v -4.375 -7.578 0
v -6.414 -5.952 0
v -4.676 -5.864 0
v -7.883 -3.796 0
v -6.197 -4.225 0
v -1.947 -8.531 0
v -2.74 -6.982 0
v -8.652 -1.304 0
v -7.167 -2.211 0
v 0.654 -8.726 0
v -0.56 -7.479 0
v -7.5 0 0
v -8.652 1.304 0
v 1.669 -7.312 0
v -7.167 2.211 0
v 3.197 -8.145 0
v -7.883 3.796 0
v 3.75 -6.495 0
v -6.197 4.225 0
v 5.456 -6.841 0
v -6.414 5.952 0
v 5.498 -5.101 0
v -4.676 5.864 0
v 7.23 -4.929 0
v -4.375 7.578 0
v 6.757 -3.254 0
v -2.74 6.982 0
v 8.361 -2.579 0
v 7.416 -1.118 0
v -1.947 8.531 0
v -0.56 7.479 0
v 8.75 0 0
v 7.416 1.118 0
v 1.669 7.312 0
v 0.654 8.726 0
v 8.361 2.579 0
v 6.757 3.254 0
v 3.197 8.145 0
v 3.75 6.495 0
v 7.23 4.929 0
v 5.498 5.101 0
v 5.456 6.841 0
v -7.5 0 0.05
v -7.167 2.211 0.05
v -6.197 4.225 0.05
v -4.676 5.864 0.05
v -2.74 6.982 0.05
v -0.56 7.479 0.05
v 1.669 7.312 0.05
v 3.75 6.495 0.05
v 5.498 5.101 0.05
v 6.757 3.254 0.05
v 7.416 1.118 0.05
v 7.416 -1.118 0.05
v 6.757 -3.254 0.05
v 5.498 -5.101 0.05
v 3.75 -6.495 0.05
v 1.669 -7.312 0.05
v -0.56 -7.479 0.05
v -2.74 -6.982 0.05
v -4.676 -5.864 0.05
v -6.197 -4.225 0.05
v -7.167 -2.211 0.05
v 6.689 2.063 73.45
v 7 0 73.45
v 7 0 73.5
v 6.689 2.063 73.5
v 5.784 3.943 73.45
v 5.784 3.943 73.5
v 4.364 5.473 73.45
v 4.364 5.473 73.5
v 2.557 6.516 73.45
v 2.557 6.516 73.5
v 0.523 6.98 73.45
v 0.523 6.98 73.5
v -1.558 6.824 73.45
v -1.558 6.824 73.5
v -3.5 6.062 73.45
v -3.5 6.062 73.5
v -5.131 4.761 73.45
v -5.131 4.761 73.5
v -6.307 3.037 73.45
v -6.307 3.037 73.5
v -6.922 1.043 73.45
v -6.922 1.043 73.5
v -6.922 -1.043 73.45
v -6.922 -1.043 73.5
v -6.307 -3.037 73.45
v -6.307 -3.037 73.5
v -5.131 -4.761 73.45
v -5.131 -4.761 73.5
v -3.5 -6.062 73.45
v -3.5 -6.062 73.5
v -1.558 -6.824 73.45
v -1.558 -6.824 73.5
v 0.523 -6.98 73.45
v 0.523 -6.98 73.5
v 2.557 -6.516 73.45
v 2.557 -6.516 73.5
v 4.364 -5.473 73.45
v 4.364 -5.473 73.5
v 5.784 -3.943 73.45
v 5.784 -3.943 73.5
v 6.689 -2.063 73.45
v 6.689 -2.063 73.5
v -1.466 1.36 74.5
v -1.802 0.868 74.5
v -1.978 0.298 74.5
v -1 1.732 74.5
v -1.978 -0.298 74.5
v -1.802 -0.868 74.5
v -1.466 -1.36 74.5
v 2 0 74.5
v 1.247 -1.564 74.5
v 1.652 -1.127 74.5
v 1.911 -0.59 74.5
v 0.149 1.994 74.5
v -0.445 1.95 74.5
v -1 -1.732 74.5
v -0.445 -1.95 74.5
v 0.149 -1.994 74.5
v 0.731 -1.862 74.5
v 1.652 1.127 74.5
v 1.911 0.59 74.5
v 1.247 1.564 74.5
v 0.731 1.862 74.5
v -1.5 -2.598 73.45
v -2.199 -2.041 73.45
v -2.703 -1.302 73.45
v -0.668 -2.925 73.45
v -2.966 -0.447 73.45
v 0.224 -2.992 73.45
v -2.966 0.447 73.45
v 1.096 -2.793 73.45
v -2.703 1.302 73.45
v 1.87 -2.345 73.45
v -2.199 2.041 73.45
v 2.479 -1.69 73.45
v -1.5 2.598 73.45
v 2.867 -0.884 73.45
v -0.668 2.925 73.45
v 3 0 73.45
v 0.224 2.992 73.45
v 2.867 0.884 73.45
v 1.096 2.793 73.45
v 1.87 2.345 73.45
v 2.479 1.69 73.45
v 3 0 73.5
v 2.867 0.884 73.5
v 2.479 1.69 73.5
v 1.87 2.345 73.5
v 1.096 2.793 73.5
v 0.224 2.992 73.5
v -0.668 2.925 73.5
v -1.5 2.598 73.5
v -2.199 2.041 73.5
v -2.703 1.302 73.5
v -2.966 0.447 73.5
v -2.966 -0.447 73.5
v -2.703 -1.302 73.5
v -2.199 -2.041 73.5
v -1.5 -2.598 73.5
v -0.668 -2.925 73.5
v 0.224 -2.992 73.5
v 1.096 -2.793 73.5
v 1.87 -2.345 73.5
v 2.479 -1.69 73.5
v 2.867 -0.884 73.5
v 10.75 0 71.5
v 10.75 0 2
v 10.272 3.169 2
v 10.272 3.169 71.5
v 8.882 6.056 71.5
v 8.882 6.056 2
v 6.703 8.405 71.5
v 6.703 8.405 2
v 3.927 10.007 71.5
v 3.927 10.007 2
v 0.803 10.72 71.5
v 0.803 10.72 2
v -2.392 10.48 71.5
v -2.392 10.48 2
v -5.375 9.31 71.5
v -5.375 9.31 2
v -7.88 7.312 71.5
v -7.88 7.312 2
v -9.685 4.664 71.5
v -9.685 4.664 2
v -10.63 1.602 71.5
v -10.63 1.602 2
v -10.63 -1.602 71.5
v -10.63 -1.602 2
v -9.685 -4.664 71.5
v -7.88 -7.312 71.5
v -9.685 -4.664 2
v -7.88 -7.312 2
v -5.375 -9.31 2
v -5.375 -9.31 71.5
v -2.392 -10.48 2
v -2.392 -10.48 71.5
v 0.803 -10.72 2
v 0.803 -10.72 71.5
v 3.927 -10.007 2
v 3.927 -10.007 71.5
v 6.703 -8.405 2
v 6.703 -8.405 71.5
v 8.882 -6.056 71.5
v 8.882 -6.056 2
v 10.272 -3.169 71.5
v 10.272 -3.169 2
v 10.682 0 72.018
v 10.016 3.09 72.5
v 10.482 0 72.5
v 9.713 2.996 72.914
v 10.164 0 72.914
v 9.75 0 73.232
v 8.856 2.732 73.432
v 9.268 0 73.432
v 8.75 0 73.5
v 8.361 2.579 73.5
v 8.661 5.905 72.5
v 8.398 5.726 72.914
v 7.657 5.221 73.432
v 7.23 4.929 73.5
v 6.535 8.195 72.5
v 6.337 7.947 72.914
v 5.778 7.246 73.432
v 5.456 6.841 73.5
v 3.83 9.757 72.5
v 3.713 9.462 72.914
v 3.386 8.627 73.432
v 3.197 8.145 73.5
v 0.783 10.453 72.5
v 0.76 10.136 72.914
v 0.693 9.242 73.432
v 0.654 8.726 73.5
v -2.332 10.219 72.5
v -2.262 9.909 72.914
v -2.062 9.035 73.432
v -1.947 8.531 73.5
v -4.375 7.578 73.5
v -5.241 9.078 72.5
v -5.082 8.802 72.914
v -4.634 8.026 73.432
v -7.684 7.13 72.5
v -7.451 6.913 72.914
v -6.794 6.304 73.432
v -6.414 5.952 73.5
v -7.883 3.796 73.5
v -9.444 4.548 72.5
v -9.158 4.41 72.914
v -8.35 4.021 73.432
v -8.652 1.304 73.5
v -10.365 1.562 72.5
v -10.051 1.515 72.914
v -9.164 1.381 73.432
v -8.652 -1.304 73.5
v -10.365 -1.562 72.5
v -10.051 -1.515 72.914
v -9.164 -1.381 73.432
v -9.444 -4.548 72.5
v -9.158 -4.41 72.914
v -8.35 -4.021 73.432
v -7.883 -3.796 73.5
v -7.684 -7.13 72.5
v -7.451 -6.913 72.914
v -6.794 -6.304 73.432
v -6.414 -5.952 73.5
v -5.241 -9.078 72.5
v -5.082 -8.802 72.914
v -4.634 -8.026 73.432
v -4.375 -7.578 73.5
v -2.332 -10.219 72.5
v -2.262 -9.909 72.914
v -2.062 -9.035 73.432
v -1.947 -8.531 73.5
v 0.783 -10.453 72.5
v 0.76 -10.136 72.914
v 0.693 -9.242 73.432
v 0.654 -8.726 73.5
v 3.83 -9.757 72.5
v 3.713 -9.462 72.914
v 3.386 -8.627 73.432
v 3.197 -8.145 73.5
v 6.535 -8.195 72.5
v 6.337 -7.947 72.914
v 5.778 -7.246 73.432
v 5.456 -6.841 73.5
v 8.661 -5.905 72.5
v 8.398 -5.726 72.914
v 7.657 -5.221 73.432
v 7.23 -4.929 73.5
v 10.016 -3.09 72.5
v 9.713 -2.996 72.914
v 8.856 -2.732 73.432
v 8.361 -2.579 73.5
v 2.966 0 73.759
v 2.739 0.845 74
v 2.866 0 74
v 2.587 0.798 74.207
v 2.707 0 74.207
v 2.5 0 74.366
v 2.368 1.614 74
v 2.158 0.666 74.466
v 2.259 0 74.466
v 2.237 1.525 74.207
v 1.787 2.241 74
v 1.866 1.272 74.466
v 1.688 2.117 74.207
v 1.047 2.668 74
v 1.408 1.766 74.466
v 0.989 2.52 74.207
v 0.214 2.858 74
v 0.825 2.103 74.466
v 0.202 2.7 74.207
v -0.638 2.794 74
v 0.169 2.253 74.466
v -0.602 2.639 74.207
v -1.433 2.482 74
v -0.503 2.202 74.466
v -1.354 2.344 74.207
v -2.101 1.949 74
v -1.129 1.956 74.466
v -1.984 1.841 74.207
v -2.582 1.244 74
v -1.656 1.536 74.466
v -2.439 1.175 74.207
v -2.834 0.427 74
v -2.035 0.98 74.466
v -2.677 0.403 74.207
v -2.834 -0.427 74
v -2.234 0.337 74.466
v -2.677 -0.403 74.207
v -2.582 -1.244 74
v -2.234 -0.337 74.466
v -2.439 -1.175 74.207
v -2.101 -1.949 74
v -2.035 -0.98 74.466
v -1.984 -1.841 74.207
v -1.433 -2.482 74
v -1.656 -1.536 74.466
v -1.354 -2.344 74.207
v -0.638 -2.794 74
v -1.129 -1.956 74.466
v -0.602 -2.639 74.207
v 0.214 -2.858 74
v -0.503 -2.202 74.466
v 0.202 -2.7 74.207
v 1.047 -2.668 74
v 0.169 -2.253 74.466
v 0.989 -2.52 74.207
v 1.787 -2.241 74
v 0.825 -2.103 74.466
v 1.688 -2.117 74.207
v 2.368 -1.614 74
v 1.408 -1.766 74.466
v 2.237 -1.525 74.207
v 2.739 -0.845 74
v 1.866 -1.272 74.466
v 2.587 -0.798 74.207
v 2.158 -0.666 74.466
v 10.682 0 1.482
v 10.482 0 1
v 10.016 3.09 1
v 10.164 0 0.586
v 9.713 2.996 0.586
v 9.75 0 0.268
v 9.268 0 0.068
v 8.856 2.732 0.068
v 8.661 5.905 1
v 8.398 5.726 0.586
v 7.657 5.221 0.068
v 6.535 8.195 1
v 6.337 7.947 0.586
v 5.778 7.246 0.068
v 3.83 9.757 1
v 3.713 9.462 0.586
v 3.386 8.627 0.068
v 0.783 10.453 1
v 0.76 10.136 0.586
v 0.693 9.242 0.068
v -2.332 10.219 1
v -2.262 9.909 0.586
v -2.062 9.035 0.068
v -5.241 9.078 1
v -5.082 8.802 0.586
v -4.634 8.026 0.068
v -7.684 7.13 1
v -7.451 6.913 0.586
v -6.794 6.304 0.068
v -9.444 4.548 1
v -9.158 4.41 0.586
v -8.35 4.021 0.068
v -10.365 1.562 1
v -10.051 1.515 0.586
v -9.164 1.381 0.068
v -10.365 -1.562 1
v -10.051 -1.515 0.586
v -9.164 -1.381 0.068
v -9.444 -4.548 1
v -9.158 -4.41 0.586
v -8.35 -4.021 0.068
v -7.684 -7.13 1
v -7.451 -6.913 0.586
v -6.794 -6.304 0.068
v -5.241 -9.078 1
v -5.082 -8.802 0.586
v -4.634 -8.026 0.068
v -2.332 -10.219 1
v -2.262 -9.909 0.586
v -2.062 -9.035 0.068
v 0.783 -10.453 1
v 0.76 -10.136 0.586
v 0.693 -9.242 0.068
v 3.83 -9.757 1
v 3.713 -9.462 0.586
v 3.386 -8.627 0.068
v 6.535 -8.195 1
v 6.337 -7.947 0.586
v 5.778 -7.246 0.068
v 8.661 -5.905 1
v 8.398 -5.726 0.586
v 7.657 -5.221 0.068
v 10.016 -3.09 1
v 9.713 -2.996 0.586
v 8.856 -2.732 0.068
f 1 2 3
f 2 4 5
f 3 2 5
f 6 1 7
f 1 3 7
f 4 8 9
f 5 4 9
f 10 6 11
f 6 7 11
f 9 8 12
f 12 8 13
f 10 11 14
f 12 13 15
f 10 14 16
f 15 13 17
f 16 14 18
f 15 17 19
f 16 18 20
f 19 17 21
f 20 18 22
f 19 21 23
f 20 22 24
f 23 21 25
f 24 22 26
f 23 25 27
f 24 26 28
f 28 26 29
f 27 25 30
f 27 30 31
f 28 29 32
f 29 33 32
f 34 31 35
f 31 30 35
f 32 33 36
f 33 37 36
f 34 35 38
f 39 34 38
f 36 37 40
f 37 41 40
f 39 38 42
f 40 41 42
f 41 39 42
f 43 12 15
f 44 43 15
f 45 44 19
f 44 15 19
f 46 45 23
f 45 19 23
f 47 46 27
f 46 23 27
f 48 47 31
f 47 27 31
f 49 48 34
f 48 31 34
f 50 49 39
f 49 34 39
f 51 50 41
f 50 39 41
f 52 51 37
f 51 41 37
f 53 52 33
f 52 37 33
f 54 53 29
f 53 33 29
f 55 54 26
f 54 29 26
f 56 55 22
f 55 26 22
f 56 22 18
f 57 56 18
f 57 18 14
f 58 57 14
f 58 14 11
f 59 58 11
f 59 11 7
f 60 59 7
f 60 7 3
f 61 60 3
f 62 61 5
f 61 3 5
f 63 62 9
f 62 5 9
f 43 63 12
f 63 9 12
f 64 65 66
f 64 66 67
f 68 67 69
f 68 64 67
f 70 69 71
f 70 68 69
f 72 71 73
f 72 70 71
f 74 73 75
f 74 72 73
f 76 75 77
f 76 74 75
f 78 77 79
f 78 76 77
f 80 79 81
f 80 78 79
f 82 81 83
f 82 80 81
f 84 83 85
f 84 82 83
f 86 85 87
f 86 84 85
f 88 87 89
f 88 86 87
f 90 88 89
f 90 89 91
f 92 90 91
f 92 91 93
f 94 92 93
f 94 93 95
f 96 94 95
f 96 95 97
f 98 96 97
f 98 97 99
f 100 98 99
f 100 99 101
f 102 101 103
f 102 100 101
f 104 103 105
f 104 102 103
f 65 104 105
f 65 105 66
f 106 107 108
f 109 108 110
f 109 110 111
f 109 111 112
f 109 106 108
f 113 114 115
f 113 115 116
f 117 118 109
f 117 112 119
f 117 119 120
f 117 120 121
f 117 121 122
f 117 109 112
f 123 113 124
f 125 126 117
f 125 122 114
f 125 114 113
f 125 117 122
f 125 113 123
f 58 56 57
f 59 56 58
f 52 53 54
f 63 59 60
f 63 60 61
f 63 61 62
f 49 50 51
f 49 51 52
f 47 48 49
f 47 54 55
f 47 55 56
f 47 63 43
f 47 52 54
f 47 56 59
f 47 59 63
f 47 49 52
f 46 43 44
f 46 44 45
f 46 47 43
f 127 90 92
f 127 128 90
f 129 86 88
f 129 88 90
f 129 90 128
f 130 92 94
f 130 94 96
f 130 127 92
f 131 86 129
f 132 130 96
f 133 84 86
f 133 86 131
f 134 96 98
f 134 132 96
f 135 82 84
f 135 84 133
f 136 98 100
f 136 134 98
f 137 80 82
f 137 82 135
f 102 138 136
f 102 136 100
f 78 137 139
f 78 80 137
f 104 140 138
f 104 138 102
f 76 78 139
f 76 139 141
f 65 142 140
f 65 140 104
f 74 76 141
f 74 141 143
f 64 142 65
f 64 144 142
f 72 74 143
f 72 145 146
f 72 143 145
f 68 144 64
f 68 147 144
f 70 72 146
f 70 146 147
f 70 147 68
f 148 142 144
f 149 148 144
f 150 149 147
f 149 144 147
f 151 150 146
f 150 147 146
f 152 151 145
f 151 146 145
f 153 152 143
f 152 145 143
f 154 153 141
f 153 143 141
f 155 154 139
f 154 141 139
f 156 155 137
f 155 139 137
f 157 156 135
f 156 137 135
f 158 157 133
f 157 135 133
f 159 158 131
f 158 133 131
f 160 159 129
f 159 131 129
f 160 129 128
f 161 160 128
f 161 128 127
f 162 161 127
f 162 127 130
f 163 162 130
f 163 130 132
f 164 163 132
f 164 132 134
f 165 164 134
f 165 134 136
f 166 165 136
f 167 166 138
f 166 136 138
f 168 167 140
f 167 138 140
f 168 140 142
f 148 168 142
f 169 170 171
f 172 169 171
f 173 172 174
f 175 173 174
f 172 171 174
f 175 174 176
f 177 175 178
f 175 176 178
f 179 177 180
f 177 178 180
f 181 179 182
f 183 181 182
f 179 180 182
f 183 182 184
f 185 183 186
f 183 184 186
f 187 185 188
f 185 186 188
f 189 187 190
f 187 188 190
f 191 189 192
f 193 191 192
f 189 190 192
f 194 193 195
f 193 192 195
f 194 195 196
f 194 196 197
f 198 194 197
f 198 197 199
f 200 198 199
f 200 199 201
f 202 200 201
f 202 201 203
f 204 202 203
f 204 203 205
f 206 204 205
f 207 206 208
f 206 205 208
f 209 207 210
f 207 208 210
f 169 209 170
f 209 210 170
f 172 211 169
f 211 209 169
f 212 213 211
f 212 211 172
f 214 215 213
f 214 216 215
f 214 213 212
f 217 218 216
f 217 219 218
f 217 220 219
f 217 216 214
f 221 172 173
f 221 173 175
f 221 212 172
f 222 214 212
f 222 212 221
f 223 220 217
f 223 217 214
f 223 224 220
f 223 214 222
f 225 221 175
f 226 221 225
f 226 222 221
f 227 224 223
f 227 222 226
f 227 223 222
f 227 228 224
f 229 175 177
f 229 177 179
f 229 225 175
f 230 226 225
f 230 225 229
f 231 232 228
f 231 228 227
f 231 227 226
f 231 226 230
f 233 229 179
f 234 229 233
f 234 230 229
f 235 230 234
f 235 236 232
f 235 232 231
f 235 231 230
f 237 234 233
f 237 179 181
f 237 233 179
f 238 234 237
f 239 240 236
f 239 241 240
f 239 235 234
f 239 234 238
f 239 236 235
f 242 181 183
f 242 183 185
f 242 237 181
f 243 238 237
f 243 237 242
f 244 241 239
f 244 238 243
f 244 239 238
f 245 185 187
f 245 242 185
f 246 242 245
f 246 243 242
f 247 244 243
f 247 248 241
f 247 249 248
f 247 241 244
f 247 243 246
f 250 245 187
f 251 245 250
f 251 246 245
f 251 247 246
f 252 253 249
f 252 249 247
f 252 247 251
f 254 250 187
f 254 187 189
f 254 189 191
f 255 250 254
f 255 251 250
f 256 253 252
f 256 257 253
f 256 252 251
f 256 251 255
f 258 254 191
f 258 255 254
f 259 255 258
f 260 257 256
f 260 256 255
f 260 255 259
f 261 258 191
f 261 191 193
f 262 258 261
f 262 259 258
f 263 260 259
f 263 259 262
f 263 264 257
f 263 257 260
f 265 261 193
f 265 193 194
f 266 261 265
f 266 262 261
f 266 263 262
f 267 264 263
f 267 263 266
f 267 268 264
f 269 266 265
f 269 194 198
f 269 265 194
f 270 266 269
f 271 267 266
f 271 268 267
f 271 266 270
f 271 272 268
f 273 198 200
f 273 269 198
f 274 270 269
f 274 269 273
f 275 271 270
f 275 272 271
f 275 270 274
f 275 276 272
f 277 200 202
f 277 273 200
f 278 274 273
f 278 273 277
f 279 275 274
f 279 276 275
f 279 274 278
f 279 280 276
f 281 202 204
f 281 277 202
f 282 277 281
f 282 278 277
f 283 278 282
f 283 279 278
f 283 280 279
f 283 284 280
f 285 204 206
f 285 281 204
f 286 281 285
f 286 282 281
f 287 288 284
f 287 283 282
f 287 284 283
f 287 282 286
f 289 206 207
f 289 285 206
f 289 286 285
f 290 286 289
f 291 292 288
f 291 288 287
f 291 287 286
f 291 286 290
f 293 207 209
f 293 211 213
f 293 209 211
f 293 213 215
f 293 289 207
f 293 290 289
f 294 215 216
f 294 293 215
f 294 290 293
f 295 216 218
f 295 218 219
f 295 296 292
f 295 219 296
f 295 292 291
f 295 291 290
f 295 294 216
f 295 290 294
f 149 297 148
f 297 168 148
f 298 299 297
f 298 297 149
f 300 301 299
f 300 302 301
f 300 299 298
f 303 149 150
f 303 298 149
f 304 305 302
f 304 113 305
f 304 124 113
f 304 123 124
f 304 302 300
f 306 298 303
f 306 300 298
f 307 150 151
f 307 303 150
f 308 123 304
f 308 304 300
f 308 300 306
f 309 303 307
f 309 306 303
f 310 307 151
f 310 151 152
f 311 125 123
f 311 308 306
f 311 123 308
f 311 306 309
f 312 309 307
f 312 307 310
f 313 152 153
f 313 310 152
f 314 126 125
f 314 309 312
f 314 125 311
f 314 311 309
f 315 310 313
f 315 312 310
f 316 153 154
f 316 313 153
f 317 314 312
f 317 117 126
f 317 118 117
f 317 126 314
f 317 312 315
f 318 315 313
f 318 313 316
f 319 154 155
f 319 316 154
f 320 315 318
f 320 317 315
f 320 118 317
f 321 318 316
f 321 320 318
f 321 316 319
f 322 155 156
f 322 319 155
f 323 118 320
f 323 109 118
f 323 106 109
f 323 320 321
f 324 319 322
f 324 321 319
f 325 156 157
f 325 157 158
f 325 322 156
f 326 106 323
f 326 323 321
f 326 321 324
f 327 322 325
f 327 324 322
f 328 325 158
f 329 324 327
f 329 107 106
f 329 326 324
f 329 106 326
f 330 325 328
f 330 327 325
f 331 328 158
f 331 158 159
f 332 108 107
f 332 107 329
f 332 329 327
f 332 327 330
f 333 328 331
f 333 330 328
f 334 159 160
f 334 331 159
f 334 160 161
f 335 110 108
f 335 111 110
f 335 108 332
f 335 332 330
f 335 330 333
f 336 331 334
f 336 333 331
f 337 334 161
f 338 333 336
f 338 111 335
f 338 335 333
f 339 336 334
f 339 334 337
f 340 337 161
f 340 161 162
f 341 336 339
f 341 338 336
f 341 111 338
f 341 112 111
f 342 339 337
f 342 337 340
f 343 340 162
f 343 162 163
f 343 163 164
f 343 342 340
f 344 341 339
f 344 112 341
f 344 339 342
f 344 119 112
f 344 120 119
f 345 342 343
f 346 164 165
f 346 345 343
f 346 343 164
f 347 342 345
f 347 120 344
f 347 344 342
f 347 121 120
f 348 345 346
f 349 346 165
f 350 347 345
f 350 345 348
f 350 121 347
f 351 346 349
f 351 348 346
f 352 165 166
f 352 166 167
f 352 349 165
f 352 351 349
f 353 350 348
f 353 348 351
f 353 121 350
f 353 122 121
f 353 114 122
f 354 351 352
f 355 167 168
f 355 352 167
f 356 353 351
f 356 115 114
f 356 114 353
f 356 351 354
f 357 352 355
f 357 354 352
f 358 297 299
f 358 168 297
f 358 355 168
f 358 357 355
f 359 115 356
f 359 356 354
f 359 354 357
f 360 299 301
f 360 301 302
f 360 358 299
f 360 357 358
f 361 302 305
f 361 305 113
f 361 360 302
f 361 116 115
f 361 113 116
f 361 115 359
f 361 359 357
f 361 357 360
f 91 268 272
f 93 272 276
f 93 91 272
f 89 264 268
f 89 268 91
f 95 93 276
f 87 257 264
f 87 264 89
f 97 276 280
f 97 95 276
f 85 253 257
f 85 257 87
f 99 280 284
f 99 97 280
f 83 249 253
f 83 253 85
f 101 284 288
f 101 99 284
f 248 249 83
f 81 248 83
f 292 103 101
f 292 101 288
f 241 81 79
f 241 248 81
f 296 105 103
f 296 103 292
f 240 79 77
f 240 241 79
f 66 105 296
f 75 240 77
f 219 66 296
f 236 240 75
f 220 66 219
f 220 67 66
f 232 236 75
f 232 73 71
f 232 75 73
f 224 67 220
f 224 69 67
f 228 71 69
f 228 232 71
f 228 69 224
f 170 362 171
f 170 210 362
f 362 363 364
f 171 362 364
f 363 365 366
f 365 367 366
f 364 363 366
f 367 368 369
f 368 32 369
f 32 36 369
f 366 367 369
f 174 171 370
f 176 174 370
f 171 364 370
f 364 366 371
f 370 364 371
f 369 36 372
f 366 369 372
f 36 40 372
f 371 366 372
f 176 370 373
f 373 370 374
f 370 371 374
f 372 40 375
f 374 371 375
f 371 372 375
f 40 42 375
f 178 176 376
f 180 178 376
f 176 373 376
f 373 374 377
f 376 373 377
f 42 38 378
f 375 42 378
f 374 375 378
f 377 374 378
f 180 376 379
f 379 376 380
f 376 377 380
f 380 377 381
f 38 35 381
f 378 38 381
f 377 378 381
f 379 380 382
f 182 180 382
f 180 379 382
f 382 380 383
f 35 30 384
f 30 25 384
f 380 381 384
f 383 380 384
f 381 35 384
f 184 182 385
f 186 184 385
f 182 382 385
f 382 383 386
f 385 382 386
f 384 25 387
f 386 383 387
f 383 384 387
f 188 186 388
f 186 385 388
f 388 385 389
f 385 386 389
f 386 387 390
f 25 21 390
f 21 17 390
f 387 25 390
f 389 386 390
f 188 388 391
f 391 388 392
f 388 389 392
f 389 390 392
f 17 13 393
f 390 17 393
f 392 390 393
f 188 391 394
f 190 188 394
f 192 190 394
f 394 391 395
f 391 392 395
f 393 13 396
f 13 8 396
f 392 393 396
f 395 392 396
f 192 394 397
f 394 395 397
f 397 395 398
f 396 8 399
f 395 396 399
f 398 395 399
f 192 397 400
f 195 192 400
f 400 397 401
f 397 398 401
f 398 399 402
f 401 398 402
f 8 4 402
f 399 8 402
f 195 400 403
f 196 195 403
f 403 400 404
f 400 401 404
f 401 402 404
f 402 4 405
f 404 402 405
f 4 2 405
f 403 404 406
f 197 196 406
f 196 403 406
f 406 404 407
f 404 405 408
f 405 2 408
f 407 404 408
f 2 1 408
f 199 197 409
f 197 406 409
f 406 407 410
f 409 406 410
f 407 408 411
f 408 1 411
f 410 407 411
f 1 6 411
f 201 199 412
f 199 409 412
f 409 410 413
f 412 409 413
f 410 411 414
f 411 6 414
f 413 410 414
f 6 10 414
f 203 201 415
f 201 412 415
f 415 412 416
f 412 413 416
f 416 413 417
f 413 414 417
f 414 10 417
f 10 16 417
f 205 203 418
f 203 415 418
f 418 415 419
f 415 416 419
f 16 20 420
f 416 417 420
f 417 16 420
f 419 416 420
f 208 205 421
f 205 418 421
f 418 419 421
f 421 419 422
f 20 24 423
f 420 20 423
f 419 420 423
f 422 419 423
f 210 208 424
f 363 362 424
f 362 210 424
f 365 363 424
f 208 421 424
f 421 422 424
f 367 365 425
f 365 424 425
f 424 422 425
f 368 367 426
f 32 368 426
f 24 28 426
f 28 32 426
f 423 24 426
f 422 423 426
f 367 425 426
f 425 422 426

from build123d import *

# Parameters (mm, degrees)
SKETCH1_R           = 10.75
BOSS_EXTRUDE1_DEPTH = 73.5
SKETCH2_R           = 3
BOSS_EXTRUDE2_DEPTH = 1
CUT_EXTRUDE1_START  = -0.05
SKETCH2_3_R         = 7
SKETCH2_3_R_2       = 3
CUT_EXTRUDE1_DEPTH  = 0.05
SKETCH3_R           = 7.5
CUT_EXTRUDE2_DEPTH  = 0.05
FILLET1_R           = 2
FILLET2_R           = 1


with BuildPart() as part:
    # Sketch1 → Boss-Extrude1 (new body)
    with BuildSketch(Plane.XY):
        Circle(SKETCH1_R)
    extrude(amount=BOSS_EXTRUDE1_DEPTH)

    # Sketch2 → Boss-Extrude2 (add)
    with BuildSketch(Plane.XY.offset(73.5)):
        Circle(SKETCH2_R)
    extrude(amount=BOSS_EXTRUDE2_DEPTH)

    # Sketch2<3> → Cut-Extrude1 (cut)
    with BuildSketch(Plane.XY.offset(73.5).offset(CUT_EXTRUDE1_START)):
        Circle(SKETCH2_3_R)
        Circle(SKETCH2_3_R_2, mode=Mode.SUBTRACT)
    extrude(amount=CUT_EXTRUDE1_DEPTH, mode=Mode.SUBTRACT)

    # Sketch3 → Cut-Extrude2 (cut)
    with BuildSketch(Plane(origin=(0, 0, 0), x_dir=(-1, 0, 0), z_dir=(0, 0, -1))):
        Circle(SKETCH3_R)
    extrude(amount=-CUT_EXTRUDE2_DEPTH, mode=Mode.SUBTRACT)

    # Fillet1
    fillet1_edges = [part.edges().sort_by_distance(p)[0] for p in [
        (-10.75, 0, 0),
        (-10.75, 0, 73.5),
    ]]
    fillet(fillet1_edges, radius=FILLET1_R)

    # Fillet2
    fillet2_edges = [part.edges().sort_by_distance(p)[0] for p in [
        (-3, 0, 74.5),
    ]]
    fillet(fillet2_edges, radius=FILLET2_R)


solid = part.part
